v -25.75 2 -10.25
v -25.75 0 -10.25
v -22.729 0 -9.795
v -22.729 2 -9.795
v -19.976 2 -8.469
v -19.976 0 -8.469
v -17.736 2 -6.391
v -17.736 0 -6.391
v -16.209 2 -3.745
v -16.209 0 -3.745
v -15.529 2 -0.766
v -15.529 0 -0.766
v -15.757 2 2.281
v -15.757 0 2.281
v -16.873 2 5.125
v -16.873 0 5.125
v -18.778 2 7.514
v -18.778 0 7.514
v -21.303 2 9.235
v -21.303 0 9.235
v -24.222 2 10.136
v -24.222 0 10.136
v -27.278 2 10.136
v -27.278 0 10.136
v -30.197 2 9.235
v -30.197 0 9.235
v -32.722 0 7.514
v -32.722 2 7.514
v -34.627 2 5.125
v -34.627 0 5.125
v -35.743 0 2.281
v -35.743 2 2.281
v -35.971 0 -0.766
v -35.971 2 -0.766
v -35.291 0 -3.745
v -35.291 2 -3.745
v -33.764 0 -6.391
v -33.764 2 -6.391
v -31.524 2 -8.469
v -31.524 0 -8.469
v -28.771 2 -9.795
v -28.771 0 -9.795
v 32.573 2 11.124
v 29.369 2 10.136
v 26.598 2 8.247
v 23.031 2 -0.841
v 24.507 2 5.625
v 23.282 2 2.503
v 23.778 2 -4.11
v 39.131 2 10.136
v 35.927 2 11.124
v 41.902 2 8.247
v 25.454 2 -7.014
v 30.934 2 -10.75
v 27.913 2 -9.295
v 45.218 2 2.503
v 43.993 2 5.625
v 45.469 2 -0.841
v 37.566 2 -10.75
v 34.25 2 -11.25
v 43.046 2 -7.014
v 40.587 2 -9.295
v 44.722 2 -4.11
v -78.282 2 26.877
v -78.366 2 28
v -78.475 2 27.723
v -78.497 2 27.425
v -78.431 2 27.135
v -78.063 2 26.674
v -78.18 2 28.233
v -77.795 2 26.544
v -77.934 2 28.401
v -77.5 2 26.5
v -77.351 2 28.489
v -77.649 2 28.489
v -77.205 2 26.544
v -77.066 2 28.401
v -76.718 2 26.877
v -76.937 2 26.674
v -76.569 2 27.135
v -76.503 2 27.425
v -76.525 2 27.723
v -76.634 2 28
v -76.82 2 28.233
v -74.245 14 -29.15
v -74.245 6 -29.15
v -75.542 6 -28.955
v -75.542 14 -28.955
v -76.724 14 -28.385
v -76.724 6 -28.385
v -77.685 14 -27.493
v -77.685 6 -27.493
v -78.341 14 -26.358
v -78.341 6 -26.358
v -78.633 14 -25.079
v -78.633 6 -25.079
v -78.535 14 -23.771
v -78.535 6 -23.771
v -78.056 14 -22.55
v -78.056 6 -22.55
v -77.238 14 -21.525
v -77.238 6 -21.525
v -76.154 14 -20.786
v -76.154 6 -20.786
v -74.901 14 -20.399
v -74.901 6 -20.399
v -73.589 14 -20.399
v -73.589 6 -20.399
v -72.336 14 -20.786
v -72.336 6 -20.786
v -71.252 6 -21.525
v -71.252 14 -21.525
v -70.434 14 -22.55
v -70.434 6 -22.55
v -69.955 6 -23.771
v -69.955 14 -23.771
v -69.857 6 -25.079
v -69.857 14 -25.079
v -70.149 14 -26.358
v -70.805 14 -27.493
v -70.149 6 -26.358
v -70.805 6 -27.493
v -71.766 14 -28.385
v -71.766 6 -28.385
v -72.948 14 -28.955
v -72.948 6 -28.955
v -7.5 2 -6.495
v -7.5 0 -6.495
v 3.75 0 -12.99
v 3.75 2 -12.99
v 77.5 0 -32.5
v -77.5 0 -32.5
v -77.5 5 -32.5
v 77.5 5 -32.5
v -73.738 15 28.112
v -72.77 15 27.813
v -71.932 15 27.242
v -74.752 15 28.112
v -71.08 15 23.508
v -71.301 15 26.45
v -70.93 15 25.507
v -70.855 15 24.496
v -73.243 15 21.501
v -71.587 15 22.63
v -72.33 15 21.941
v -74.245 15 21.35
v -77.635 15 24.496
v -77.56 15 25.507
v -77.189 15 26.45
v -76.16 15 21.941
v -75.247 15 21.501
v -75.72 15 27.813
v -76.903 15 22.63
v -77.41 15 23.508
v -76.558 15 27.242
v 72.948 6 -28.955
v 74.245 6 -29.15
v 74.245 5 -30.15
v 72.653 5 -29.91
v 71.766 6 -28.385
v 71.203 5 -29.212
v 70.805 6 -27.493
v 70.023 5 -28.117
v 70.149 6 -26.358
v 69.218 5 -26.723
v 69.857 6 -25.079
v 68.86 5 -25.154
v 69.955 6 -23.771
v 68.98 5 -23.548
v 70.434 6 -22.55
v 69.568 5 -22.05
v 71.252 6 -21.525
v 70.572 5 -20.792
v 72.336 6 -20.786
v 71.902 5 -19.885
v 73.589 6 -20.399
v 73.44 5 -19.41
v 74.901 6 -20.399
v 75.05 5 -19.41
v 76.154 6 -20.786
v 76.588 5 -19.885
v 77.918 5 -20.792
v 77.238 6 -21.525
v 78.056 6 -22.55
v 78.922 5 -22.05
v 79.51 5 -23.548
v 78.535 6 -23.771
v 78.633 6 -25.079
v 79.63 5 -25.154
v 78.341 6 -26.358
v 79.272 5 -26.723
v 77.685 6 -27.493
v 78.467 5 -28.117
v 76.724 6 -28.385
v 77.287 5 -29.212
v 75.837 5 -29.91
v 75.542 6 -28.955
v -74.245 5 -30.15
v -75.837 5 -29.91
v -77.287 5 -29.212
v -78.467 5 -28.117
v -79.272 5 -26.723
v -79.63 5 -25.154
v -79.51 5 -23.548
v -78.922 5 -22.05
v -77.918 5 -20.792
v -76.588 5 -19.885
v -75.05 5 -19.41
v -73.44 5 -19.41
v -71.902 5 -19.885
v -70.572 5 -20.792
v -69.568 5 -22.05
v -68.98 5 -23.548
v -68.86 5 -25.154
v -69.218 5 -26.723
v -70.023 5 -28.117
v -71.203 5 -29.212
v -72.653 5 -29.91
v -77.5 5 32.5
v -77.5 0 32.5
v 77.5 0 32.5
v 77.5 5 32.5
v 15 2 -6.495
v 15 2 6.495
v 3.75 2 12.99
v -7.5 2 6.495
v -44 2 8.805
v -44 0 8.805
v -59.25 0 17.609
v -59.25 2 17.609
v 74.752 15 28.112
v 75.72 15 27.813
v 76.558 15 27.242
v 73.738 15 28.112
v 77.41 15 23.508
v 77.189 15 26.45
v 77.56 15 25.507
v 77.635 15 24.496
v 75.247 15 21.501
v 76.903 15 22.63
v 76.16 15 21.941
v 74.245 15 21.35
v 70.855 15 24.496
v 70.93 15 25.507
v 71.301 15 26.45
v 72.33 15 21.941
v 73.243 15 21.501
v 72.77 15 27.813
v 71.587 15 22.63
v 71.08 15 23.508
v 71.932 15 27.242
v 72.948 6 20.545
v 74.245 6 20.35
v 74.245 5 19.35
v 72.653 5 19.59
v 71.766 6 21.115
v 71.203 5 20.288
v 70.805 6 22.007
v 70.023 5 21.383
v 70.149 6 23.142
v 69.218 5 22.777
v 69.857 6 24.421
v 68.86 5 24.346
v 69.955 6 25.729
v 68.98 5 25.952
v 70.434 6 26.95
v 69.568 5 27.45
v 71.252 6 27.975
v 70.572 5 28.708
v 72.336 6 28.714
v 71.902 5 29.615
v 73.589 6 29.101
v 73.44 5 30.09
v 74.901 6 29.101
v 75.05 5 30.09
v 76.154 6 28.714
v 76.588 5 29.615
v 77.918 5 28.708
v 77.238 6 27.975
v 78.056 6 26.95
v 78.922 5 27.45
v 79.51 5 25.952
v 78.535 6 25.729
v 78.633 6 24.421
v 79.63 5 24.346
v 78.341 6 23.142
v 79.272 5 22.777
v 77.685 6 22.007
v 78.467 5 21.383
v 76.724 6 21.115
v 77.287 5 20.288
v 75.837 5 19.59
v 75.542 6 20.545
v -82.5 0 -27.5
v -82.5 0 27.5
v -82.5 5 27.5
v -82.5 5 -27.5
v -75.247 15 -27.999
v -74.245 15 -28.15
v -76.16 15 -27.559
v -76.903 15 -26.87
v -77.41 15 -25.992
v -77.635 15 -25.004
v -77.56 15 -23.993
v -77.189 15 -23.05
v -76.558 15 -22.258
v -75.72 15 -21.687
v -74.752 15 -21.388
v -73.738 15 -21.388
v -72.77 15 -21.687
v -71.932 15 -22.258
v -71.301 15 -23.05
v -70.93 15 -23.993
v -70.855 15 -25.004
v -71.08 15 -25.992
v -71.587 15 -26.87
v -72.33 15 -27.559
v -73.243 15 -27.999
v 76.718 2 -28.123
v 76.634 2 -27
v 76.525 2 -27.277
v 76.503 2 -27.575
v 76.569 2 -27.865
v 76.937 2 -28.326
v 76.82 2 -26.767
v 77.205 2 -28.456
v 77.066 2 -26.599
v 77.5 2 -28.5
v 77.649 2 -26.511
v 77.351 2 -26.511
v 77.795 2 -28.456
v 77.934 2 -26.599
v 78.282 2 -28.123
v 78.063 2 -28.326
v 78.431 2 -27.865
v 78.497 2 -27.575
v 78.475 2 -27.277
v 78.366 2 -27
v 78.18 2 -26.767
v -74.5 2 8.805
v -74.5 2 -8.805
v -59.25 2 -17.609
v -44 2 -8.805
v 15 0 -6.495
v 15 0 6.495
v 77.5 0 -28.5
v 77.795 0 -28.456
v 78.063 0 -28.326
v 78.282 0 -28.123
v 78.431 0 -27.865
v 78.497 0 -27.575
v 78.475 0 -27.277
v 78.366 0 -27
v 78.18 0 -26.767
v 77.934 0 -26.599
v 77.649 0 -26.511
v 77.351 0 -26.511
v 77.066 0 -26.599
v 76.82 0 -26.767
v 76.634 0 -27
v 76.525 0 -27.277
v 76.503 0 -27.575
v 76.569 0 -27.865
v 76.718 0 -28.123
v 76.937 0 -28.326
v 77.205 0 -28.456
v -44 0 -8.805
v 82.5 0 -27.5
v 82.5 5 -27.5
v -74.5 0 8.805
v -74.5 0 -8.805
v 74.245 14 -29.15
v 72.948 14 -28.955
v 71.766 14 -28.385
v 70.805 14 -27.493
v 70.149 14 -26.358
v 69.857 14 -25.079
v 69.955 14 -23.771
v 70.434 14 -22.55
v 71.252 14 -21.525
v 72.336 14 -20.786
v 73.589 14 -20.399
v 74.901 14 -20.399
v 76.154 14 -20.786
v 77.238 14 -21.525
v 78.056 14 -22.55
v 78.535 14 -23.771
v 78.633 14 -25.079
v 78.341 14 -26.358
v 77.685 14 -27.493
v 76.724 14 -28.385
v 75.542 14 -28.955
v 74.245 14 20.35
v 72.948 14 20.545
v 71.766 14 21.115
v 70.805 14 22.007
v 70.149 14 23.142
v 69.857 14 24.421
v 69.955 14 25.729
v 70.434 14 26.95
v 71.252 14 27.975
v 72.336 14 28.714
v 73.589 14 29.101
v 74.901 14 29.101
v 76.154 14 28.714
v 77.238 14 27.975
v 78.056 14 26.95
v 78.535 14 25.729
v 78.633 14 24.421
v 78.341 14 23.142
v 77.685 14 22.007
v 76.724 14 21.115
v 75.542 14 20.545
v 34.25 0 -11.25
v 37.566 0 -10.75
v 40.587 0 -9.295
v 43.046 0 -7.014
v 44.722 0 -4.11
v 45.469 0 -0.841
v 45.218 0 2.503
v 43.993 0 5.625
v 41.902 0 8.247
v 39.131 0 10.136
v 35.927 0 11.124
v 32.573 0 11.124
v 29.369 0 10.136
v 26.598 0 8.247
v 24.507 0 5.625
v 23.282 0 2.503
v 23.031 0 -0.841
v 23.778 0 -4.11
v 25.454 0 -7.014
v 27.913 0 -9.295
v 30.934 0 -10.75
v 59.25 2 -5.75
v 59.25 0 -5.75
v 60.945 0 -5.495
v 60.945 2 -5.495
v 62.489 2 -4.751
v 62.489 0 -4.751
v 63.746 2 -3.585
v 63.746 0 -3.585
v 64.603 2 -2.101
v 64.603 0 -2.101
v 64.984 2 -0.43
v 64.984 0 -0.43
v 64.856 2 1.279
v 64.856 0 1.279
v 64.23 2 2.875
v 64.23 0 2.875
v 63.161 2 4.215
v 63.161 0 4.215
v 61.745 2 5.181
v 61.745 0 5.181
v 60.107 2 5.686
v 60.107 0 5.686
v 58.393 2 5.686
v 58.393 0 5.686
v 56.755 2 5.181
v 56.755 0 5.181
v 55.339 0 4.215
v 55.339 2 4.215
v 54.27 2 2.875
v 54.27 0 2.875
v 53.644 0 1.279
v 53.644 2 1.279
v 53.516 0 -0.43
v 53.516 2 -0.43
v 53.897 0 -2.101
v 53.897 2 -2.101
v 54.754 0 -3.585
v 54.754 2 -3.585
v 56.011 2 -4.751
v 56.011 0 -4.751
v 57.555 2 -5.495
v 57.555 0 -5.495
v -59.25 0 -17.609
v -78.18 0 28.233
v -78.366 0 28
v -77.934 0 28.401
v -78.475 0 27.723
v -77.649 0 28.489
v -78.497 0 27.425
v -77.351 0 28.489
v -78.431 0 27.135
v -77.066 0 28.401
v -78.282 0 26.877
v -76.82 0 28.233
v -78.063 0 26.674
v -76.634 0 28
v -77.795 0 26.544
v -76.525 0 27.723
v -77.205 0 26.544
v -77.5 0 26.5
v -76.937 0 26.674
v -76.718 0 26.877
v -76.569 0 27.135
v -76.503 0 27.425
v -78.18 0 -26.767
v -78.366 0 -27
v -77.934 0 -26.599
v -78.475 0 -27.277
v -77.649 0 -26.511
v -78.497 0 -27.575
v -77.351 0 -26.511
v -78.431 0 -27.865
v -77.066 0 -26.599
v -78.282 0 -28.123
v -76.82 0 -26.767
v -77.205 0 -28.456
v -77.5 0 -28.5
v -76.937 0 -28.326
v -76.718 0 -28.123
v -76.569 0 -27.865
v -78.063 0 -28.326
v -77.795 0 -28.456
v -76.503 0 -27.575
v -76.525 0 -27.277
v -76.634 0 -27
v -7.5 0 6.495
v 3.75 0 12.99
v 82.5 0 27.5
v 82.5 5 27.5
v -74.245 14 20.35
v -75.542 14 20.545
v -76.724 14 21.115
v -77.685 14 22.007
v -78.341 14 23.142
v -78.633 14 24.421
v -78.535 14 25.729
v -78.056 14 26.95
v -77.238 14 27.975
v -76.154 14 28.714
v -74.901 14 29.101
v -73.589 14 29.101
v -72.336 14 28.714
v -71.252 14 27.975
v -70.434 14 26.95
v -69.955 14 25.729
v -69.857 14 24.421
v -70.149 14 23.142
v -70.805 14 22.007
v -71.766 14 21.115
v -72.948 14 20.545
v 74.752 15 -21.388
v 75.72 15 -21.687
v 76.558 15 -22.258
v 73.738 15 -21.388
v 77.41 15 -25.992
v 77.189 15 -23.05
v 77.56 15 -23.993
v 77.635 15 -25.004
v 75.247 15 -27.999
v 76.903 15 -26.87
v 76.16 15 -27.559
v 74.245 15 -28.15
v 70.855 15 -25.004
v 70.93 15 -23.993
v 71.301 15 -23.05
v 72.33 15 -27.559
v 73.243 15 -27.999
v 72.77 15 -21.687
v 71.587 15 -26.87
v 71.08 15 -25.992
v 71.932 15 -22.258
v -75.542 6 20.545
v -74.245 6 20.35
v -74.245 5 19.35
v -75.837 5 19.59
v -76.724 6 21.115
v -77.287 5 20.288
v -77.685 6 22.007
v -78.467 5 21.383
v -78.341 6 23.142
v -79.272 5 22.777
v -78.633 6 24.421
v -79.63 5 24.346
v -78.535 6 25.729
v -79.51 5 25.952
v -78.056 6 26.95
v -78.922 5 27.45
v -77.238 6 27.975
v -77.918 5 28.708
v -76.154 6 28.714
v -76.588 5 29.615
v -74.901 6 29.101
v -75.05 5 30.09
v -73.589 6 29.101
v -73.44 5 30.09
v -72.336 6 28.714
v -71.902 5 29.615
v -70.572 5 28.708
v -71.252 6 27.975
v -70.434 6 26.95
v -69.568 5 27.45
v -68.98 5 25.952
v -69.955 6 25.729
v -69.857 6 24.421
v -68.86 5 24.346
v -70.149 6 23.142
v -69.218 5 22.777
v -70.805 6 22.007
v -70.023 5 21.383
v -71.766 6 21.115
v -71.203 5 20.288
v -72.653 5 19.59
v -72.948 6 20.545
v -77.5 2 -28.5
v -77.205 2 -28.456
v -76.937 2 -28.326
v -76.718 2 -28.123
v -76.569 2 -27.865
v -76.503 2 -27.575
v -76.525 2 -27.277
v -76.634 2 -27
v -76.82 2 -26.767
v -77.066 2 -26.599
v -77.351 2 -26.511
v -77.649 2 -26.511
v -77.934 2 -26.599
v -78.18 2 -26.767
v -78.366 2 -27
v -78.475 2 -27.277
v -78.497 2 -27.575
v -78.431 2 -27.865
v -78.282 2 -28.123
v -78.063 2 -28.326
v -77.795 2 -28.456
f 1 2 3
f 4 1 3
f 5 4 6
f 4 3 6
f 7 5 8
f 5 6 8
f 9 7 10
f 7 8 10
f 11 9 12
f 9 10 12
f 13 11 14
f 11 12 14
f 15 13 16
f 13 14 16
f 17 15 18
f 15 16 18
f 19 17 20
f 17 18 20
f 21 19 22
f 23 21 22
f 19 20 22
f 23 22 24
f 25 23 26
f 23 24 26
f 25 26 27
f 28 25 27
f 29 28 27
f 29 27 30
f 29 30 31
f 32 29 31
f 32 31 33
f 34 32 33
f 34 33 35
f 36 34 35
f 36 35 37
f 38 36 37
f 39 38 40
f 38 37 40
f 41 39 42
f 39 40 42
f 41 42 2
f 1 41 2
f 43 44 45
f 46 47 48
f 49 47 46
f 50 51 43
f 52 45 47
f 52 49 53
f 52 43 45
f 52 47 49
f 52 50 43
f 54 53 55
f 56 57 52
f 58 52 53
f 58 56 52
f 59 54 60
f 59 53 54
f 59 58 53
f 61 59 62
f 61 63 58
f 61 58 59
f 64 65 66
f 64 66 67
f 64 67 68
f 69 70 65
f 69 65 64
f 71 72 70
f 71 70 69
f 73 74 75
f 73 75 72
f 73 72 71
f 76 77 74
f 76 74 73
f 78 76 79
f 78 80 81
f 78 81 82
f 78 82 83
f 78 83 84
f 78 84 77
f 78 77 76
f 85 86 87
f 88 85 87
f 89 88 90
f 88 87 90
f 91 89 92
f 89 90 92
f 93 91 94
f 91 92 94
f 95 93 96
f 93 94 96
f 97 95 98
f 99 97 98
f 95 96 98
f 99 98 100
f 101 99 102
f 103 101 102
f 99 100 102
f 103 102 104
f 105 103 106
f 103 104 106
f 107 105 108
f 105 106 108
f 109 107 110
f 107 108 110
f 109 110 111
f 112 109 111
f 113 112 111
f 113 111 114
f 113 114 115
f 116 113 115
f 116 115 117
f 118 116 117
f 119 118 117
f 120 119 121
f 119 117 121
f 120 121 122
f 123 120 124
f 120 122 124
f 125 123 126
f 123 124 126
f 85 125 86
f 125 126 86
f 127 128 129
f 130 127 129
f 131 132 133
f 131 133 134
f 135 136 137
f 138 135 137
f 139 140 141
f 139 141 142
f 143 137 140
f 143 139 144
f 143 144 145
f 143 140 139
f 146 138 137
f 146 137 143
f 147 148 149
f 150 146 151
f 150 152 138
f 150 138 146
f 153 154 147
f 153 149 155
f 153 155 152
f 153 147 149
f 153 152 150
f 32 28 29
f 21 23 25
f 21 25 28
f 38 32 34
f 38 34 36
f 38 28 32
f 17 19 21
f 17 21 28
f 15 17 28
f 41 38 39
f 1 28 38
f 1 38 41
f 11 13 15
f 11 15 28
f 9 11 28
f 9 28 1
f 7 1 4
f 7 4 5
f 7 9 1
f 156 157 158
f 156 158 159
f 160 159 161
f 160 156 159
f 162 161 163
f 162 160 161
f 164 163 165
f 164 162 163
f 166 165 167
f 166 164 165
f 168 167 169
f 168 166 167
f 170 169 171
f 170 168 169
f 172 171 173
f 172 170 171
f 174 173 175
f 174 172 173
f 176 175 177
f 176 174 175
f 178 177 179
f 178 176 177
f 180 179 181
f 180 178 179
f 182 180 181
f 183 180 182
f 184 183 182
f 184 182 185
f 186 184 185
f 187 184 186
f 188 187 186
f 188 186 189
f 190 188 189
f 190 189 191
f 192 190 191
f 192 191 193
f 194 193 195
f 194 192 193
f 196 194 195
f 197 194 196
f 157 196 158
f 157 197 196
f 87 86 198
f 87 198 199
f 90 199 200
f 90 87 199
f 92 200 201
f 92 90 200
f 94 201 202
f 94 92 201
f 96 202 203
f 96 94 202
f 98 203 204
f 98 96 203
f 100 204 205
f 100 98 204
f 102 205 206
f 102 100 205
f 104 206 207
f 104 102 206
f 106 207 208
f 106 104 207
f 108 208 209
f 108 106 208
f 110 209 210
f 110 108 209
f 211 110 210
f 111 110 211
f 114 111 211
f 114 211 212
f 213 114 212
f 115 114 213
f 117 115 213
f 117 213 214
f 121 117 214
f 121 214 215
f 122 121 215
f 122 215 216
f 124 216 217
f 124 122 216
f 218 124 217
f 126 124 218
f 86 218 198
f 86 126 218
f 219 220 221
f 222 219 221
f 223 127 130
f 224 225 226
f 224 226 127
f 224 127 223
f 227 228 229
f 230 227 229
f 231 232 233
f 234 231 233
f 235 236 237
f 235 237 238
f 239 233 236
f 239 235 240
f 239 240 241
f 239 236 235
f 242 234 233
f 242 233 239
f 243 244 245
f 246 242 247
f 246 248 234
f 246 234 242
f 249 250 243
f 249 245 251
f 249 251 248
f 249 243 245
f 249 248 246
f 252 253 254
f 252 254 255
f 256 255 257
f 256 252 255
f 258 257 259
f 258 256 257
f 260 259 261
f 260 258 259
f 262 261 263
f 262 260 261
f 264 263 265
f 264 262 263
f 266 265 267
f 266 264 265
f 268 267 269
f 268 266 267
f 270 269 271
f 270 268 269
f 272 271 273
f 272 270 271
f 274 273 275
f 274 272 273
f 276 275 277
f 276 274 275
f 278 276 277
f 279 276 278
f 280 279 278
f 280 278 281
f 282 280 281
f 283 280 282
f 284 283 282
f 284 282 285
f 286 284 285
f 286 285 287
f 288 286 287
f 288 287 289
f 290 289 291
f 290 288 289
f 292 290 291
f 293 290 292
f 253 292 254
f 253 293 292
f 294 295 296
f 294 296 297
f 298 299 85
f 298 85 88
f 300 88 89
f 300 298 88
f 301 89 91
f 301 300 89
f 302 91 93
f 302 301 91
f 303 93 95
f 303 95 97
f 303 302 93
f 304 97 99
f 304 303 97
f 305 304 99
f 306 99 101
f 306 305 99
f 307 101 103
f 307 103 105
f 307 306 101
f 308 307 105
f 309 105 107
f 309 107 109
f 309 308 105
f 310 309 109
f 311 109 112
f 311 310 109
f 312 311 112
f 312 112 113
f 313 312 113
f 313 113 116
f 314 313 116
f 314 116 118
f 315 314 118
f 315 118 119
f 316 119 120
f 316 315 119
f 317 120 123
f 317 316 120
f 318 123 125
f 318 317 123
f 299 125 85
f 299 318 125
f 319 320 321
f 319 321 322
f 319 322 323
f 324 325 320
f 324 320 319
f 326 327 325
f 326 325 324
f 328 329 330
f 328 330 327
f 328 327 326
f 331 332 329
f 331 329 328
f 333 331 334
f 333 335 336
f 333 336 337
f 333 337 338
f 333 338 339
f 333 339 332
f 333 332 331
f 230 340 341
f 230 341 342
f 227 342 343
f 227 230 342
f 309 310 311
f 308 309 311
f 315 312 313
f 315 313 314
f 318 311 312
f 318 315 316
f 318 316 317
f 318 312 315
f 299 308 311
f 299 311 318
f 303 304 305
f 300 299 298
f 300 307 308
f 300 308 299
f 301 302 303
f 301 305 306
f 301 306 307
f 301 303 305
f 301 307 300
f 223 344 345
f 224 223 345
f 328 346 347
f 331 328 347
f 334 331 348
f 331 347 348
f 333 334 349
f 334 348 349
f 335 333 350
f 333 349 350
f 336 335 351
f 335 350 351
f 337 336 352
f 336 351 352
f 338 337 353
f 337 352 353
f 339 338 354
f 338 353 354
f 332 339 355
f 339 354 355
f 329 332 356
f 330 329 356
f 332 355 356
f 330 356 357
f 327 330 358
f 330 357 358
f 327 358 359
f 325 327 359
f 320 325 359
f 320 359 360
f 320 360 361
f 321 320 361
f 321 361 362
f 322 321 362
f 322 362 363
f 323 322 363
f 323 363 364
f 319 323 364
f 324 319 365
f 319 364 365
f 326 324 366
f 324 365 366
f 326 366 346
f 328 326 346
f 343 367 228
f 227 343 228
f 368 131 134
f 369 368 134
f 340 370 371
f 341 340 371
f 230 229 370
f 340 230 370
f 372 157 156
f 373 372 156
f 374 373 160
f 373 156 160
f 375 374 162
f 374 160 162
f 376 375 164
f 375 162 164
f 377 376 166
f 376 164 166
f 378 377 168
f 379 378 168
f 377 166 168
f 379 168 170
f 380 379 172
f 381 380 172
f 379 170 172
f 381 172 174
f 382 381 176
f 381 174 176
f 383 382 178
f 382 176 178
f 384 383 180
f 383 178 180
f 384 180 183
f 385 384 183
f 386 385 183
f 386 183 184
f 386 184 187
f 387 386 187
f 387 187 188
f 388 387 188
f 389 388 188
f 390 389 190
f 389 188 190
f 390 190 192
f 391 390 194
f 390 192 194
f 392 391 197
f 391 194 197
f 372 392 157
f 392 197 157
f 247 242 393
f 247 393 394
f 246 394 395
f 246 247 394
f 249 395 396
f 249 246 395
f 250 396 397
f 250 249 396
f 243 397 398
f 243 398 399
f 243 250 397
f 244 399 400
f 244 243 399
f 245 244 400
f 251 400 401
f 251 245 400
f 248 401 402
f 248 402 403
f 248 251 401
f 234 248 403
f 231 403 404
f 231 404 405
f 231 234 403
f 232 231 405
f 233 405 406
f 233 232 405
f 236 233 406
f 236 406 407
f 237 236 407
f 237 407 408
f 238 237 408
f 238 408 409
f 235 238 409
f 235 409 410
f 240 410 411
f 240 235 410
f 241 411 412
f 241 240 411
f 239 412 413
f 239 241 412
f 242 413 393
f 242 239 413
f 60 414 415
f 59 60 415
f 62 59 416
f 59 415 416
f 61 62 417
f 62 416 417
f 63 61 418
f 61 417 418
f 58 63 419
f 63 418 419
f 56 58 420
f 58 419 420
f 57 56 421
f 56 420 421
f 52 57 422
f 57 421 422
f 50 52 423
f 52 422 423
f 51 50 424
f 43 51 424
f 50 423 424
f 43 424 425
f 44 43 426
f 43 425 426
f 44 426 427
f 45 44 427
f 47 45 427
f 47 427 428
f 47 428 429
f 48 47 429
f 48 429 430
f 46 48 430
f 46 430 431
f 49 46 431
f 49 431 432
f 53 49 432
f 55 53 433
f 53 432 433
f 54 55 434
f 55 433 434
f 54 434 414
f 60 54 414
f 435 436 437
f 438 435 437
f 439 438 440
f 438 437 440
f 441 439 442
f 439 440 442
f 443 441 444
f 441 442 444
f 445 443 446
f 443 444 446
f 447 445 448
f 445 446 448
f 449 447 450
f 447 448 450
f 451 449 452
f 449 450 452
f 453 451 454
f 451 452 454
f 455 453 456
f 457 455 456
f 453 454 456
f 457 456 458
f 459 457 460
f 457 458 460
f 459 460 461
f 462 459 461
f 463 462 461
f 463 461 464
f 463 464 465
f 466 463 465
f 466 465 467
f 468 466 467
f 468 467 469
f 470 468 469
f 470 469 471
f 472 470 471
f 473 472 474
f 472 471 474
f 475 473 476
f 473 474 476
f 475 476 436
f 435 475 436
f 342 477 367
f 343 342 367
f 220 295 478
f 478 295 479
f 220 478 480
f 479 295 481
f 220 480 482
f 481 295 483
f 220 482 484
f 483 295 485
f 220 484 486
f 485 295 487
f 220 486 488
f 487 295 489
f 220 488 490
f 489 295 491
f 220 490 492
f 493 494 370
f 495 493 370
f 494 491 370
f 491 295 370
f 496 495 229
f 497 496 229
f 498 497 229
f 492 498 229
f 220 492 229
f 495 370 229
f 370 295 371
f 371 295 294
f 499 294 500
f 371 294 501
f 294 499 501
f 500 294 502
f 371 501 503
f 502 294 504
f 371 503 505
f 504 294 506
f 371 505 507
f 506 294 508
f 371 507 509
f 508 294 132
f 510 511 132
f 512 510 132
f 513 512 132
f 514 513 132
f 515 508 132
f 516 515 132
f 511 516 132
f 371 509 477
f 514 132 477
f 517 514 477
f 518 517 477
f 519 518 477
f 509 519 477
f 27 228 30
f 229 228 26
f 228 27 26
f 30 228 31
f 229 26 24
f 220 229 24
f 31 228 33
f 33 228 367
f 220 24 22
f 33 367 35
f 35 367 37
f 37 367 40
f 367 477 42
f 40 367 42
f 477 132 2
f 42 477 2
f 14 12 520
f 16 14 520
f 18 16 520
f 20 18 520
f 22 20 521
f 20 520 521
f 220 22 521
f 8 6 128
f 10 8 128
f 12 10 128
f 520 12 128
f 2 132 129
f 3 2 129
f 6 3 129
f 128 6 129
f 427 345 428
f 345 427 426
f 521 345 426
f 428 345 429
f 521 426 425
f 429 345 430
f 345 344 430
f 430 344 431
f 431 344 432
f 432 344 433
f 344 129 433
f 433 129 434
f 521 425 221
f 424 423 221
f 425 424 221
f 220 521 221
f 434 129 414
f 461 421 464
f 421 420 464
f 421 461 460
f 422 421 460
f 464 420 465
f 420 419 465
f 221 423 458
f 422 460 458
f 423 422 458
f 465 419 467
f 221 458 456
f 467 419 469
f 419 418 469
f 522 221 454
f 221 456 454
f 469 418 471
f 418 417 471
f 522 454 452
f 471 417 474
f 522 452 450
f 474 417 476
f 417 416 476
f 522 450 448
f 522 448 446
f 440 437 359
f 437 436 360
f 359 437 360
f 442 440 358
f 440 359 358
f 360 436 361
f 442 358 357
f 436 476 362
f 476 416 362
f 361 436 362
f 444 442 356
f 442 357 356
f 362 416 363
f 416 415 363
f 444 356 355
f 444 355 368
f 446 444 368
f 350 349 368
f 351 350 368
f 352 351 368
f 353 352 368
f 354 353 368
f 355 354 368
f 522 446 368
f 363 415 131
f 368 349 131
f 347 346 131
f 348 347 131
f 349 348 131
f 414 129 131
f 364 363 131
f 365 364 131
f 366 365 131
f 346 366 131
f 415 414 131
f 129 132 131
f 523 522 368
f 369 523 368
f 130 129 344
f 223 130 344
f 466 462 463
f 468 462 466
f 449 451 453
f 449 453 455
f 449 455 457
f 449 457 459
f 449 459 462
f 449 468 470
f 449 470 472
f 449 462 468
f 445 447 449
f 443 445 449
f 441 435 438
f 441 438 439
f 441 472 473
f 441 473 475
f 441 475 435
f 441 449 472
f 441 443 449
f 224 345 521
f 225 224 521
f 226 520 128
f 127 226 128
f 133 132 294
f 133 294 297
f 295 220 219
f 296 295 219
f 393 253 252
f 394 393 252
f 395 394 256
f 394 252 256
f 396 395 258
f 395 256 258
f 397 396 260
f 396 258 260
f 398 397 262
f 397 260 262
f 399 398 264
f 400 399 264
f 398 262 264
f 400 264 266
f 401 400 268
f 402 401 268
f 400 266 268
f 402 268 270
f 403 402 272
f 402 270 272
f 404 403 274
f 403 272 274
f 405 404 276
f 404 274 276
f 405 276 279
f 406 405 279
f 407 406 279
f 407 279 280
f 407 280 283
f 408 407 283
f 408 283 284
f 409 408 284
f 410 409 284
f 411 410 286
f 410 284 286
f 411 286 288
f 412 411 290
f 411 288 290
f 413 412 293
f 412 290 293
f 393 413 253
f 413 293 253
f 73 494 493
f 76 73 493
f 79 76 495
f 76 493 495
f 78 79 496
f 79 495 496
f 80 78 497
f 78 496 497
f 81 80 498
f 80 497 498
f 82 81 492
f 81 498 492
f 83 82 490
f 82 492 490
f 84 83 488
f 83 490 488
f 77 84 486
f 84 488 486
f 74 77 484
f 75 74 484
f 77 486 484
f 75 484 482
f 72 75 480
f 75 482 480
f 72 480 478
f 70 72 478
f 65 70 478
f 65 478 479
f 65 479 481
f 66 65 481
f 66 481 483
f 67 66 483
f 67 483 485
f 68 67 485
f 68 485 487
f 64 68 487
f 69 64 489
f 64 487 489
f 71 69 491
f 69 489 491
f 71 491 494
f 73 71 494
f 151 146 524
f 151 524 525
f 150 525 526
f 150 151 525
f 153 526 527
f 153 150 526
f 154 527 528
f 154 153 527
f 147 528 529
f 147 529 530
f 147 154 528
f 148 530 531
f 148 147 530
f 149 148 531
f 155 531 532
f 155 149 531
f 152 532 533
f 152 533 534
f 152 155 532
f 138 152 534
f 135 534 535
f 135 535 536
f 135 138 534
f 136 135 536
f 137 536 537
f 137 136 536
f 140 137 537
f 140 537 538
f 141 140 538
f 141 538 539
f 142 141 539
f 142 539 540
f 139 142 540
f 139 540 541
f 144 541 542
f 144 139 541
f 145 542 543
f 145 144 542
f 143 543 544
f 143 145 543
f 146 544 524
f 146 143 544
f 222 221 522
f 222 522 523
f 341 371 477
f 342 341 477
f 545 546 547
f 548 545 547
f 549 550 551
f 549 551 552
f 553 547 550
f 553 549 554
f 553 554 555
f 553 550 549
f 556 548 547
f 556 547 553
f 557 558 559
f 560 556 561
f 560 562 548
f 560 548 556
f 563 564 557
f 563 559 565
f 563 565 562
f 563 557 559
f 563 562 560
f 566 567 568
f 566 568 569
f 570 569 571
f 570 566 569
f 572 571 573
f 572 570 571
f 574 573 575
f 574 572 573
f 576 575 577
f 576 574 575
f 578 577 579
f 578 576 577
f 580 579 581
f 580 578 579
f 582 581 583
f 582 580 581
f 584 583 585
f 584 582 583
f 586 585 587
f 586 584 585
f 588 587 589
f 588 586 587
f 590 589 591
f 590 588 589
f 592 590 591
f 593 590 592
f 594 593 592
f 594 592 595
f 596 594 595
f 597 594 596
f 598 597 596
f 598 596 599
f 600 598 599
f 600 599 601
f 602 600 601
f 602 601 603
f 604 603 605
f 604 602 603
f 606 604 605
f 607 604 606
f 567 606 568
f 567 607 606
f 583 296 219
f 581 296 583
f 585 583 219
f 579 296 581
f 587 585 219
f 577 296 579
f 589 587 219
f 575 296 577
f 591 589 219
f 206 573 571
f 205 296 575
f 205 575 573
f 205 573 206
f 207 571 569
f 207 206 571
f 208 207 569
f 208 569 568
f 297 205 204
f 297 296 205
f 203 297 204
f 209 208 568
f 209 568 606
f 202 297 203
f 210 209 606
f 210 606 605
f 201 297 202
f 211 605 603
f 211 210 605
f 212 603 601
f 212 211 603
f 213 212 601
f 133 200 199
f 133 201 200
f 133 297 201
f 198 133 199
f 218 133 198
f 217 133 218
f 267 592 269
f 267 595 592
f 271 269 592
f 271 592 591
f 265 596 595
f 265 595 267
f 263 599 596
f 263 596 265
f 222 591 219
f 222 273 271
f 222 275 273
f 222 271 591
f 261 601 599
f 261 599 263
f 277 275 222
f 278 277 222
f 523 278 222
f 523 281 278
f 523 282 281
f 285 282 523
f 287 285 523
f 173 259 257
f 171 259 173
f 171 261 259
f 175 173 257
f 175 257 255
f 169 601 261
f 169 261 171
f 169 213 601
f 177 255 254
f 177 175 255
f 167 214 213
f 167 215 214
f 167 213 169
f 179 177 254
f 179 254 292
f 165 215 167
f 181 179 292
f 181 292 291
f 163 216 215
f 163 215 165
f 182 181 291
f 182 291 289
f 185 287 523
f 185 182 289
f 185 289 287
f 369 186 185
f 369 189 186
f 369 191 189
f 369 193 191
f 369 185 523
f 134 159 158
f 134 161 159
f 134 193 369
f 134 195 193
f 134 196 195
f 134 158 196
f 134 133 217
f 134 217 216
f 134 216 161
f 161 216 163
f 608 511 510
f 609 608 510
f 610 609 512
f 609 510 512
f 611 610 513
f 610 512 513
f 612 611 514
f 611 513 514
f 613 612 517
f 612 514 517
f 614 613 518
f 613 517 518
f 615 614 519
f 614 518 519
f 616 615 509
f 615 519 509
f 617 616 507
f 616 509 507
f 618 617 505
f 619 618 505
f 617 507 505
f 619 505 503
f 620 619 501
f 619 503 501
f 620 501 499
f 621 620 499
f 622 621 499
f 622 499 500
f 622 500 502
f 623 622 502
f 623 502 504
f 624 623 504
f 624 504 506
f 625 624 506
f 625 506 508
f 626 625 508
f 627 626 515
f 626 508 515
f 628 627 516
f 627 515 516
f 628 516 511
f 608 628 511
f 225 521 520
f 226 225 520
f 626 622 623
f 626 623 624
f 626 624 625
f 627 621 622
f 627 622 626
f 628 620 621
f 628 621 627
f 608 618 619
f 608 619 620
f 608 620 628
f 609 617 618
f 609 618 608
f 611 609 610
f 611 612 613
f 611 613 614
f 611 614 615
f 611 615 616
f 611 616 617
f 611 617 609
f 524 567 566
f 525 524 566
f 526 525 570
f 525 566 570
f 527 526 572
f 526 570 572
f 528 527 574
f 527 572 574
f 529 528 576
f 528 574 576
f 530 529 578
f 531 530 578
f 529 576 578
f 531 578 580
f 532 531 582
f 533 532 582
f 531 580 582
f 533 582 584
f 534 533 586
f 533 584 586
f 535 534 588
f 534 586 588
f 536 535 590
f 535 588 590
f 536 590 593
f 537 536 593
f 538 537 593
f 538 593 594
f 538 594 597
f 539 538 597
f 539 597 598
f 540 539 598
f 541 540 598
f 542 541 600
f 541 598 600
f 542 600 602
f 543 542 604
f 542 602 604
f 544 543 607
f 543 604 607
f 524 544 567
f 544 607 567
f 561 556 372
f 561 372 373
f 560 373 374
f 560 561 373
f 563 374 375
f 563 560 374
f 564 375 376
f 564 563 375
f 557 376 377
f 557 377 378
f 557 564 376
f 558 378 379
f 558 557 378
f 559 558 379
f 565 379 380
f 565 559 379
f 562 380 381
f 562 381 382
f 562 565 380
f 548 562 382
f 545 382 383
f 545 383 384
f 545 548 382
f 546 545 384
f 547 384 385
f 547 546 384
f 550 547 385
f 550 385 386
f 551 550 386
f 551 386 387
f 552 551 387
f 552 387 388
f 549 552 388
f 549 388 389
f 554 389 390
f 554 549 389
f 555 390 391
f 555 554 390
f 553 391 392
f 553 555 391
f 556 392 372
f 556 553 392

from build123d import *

# Parameters (mm, degrees)
SKETCH2_W           = 165
SKETCH2_H           = 65
BOSS_EXTRUDE1_DEPTH = 5
SKETCH3_R           = 4.4
BOSS_EXTRUDE2_DEPTH = 10
CHAMFER1_SIZE       = 1
CHAMFER2_SIZE       = 5
SKETCH4_R           = 1
CUT_EXTRUDE1_DEPTH  = 2
SKETCH5_R           = 10.25
SKETCH5_R_2         = 11.25
SKETCH5_R_3         = 5.75
CUT_EXTRUDE2_DEPTH  = 2


with BuildPart() as part:
    # Sketch2 → Boss-Extrude1 (new body)
    with BuildSketch(Plane(origin=(0, 0, 0), x_dir=(1, 0, 0), z_dir=(0, 1, 0))):
        Rectangle(SKETCH2_W, SKETCH2_H)
    extrude(amount=BOSS_EXTRUDE1_DEPTH)

    # Sketch3 → Boss-Extrude2 (add)
    with BuildSketch(Plane(origin=(0, 5, 0), x_dir=(1, 0, 0), z_dir=(0, 1, 0))):
        with Locations(Location((-74.245, 24.75, 0), (0, 0, 90))):
            Circle(SKETCH3_R)
        with Locations(Location((-74.245, -24.75, 0), (0, 0, 90))):
            Circle(SKETCH3_R)
        with Locations(Location((74.245, -24.75, 0), (0, 0, 90))):
            Circle(SKETCH3_R)
        with Locations(Location((74.245, 24.75, 0), (0, 0, 90))):
            Circle(SKETCH3_R)
    extrude(amount=BOSS_EXTRUDE2_DEPTH)

    # Chamfer1
    chamfer1_edges = [part.edges().sort_by_distance(p)[0] for p in [
        (-74.245, 5, -20.35),
        (-74.245, 15, -20.35),
        (-74.245, 5, 29.15),
        (-74.245, 15, 29.15),
        (74.245, 5, 29.15),
        (74.245, 15, 29.15),
        (74.245, 5, -20.35),
        (74.245, 15, -20.35),
    ]]
    chamfer(chamfer1_edges, length=CHAMFER1_SIZE)

    # Chamfer2
    chamfer2_edges = [part.edges().sort_by_distance(p)[0] for p in [
        (82.5, 2.5, 32.5),
        (-82.5, 2.5, 32.5),
        (-82.5, 2.5, -32.5),
        (82.5, 2.5, -32.5),
    ]]
    chamfer(chamfer2_edges, length=CHAMFER2_SIZE)

    # Sketch4 → Cut-Extrude1 (cut)
    with BuildSketch(Plane.XZ):
        with Locations(Location((-77.5, 27.5, 0), (0, 0, 270))):
            Circle(SKETCH4_R)
        with Locations(Location((-77.5, -27.5, 0), (0, 0, 270))):
            Circle(SKETCH4_R)
        with Locations(Location((77.5, -27.5, 0), (0, 0, 270))):
            Circle(SKETCH4_R)
    extrude(amount=-CUT_EXTRUDE1_DEPTH, mode=Mode.SUBTRACT)

    # Sketch5 → Cut-Extrude2 (cut)
    with BuildSketch(Plane.XZ):
        with Locations(Location((-25.75, 0, 0), (0, 0, 270))):
            Circle(SKETCH5_R)
        with Locations(Location((34.25, 0, 0), (0, 0, 270))):
            Circle(SKETCH5_R_2)
        with Locations(Location((59.25, 0, 0), (0, 0, 270))):
            Circle(SKETCH5_R_3)
        Polygon((-59.25, 17.60918321), (-74.5, 8.804591605), (-74.5, -8.804591605), (-59.25, -17.60918321), (-44, -8.804591605), (-44, 8.804591605), align=None)
        Polygon((15, -6.495190528), (15, 6.495190528), (3.75, 12.990381057), (-7.5, 6.495190528), (-7.5, -6.495190528), (3.75, -12.990381057), align=None)
    extrude(amount=-CUT_EXTRUDE2_DEPTH, mode=Mode.SUBTRACT)


solid = part.part
